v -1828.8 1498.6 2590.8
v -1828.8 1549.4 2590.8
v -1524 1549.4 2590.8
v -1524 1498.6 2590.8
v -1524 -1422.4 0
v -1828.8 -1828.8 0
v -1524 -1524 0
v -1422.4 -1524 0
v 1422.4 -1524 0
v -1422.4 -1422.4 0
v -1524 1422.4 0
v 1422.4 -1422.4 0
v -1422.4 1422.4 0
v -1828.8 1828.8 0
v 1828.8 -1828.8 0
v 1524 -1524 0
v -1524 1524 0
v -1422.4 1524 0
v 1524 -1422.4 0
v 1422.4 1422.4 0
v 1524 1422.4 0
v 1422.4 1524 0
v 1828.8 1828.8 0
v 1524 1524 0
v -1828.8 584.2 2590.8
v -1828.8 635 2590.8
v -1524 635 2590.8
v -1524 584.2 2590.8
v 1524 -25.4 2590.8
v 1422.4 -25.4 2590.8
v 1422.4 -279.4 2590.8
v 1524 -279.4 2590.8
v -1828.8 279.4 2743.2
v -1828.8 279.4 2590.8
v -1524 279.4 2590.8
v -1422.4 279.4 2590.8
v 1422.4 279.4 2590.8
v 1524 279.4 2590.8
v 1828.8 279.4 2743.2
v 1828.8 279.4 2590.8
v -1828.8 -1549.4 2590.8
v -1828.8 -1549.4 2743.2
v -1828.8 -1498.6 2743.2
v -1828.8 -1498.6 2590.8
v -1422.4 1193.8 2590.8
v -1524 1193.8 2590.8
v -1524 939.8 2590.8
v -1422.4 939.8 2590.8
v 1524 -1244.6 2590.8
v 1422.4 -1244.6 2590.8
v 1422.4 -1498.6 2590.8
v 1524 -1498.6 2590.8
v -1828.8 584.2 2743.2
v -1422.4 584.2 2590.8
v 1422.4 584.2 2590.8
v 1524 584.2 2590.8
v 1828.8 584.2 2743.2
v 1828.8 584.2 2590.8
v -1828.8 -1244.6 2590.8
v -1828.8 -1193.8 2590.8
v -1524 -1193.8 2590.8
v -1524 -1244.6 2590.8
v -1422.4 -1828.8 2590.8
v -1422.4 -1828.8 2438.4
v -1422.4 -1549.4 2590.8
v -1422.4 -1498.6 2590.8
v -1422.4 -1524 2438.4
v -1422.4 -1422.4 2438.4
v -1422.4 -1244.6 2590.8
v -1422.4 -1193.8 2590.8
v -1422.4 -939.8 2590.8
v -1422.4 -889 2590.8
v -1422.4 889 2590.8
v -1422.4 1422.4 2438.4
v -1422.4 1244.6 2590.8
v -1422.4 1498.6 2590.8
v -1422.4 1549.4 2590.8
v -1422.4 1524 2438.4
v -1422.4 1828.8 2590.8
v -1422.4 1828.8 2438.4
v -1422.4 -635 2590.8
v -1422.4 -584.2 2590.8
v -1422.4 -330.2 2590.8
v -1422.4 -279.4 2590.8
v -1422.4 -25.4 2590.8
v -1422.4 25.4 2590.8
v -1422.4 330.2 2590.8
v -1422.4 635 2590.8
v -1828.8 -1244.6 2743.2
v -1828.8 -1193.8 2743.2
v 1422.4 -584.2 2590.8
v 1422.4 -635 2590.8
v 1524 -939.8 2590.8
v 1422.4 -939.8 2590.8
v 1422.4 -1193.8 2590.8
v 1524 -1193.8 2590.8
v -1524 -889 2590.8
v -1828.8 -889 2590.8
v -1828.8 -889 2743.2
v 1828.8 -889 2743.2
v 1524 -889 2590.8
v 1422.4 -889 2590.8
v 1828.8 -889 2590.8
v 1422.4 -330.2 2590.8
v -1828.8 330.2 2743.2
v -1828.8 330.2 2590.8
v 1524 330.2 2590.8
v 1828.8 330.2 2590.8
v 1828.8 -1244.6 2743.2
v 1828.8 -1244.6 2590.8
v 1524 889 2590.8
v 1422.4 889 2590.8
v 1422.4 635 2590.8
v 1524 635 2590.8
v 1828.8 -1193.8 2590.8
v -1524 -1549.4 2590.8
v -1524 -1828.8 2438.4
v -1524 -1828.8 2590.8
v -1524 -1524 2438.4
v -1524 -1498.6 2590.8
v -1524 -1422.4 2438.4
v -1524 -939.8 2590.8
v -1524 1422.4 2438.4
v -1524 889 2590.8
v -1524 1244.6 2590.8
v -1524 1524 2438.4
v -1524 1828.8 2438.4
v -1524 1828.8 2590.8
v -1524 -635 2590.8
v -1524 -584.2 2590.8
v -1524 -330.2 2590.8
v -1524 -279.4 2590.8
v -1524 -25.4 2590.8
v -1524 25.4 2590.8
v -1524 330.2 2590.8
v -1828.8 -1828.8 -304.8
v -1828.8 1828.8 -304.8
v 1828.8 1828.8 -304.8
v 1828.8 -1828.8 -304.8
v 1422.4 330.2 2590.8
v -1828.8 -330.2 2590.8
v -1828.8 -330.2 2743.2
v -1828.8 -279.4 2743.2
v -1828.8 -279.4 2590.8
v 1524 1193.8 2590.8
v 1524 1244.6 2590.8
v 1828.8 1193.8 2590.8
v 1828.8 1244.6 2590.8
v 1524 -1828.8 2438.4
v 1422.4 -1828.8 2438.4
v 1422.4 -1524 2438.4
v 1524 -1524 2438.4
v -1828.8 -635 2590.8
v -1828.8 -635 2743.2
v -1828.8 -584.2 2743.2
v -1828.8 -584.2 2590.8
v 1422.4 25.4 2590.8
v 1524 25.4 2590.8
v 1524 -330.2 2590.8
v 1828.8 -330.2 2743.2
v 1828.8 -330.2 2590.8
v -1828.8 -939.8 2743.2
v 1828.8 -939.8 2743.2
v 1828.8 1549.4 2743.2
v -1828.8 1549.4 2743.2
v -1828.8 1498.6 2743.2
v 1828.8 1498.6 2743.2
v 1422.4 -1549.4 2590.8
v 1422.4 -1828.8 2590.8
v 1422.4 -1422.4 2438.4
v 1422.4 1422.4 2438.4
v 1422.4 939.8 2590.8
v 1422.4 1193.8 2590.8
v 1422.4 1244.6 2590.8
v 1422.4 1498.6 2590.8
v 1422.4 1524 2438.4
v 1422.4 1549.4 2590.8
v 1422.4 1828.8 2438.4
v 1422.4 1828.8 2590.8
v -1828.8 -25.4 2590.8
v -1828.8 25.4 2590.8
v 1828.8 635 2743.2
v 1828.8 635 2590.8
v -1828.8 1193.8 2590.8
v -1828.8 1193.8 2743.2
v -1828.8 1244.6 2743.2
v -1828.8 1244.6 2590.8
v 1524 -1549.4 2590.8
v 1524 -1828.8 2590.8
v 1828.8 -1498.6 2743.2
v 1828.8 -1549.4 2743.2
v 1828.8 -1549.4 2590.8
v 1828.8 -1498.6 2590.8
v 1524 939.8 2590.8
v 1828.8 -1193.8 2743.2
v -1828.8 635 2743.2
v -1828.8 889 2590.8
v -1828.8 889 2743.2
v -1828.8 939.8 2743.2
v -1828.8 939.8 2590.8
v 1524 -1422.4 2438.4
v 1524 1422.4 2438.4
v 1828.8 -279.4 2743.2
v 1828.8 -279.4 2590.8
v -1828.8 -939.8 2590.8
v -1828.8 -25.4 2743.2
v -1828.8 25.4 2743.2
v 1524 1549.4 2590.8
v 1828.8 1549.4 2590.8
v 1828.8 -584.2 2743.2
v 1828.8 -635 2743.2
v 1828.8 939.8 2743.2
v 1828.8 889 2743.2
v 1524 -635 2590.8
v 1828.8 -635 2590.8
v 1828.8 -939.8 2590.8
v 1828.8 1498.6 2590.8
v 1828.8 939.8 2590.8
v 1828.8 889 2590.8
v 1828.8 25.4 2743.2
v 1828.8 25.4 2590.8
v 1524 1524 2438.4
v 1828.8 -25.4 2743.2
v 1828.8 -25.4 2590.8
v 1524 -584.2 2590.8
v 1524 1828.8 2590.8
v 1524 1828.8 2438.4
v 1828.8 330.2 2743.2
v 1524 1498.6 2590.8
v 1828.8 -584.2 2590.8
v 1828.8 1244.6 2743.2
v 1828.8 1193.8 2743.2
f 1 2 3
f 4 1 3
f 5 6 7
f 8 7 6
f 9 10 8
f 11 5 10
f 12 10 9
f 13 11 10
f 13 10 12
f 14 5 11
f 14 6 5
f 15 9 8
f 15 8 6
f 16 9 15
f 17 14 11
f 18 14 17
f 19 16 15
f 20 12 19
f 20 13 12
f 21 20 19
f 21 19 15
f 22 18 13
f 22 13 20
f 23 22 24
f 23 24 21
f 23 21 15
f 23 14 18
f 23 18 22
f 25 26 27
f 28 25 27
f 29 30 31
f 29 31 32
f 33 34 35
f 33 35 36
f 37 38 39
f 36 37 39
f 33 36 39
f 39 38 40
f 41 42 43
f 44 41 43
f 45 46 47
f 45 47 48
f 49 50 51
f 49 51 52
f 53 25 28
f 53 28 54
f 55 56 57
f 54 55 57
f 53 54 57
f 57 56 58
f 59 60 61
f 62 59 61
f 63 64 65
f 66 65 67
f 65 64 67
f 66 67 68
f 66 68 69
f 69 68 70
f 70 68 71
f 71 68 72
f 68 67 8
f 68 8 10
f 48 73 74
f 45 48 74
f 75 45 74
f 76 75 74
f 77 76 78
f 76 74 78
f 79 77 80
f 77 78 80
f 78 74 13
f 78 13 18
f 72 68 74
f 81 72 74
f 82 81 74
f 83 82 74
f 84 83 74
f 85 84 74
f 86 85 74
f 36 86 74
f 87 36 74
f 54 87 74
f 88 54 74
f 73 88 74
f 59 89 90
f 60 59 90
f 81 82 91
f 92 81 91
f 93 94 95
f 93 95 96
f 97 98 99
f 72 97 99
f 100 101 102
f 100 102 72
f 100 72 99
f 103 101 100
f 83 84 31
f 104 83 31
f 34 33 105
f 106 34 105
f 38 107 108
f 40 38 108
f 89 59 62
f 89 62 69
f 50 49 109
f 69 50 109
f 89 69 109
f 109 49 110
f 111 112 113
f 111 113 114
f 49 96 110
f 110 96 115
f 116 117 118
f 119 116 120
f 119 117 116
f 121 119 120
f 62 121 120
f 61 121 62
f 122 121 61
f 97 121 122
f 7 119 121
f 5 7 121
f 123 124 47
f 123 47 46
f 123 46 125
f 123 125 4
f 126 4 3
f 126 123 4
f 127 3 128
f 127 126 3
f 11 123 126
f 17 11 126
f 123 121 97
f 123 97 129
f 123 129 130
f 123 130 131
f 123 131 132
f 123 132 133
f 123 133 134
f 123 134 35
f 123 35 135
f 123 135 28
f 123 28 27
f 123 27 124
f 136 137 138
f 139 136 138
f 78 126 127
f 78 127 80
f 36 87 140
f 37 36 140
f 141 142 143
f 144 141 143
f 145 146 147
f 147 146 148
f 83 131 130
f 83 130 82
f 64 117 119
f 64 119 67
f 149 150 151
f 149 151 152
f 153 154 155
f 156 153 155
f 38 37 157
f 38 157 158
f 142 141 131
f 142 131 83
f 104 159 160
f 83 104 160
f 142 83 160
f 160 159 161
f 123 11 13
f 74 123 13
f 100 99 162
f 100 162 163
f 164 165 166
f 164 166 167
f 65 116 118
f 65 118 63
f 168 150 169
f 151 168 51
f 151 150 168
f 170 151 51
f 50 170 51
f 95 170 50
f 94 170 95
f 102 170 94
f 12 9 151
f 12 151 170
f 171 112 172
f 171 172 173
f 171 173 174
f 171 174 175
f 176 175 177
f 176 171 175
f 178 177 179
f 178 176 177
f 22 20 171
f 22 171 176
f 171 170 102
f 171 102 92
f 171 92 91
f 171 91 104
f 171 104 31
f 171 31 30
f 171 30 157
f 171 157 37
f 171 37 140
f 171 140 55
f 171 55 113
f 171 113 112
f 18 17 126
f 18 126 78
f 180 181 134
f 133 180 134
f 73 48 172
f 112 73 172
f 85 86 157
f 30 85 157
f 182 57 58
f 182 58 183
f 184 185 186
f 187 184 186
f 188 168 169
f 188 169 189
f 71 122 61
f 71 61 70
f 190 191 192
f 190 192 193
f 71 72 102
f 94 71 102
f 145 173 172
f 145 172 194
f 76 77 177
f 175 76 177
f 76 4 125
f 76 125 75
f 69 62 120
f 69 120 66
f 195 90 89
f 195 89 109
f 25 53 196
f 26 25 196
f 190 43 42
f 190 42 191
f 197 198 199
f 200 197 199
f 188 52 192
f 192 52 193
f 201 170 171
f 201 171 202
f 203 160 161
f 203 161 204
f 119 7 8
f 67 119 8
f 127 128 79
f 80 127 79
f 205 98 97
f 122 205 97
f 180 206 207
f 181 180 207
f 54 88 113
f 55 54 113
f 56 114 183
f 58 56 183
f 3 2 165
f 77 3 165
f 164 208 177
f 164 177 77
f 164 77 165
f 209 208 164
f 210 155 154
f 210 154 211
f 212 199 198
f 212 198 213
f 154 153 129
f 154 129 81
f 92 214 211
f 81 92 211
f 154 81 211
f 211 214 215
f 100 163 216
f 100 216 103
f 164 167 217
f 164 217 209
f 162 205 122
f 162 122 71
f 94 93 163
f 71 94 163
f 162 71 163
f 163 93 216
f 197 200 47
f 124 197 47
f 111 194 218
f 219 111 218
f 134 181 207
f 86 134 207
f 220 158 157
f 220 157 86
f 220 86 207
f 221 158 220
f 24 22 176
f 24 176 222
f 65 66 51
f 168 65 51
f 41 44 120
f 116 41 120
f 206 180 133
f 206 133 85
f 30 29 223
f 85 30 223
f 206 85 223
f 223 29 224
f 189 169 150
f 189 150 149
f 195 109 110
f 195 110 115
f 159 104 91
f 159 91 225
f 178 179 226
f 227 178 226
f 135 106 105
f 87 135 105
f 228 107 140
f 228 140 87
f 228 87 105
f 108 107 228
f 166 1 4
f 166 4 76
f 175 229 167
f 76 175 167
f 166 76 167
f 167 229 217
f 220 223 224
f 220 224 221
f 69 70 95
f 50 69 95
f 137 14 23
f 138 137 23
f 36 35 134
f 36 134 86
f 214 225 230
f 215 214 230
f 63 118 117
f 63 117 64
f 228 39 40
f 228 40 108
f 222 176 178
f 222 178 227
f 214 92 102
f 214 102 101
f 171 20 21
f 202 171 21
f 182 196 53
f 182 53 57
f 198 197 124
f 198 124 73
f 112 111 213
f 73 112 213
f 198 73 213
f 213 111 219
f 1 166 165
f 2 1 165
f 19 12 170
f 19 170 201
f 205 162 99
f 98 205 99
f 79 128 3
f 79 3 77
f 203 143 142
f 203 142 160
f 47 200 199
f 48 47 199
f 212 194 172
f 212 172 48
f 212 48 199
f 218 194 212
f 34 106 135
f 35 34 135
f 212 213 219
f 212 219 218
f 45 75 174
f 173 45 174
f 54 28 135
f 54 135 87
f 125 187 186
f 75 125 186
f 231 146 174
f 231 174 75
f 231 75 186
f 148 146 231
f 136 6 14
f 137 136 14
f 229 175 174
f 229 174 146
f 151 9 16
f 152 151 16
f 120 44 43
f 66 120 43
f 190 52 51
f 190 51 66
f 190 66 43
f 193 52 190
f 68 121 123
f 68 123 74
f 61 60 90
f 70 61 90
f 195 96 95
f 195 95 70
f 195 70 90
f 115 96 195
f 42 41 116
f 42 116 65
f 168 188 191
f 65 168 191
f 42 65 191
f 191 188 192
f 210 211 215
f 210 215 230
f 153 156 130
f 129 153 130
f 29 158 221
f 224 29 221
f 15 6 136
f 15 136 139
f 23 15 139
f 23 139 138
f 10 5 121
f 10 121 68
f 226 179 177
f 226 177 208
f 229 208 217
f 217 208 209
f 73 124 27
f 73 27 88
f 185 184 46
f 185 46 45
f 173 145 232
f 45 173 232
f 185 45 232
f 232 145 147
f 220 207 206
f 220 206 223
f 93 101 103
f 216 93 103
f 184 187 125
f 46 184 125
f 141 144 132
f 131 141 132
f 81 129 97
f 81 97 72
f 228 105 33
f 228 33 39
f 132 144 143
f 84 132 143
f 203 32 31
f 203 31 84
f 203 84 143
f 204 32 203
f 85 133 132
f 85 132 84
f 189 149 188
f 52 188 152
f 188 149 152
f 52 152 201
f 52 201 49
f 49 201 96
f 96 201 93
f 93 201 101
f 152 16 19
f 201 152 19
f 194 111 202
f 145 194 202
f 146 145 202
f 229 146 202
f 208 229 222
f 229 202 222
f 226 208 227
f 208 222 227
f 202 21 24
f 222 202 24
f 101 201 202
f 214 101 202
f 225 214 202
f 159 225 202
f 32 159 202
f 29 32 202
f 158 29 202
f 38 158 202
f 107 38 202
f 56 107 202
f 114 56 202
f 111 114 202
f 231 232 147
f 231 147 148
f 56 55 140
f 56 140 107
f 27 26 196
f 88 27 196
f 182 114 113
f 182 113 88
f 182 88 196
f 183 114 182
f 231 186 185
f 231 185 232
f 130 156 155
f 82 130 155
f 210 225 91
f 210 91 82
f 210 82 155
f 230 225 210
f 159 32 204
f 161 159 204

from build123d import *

# Parameters (mm, degrees)
F0_W     = 3657.6
F0_H     = 3657.6
F1_DEPTH = 304.8
F2_W     = 101.6
F2_H     = 101.6
F3_DEPTH = 2438.4
F4_W     = 101.6
F4_H     = 3657.6
F5_DEPTH = 152.4
F6_W     = 3657.6
F6_H     = 50.8
F7_DEPTH = 152.4


with BuildPart() as f1:
    # F0 (on Top) → F1 (new body)
    with BuildSketch(Plane.XY):
        Rectangle(F0_W, F0_H)
    extrude(amount=-F1_DEPTH)

    # F2 (on face) → F3 (join)
    with BuildSketch(Plane.XY):
        with Locations((-1473.2, 1473.2)):
            Rectangle(F2_W, F2_H)
        with Locations((1473.2, 1473.2)):
            Rectangle(F2_W, F2_H)
        with Locations((1473.2, -1473.2)):
            Rectangle(F2_W, F2_H)
        with Locations((-1473.2, -1473.2)):
            Rectangle(F2_W, F2_H)
    extrude(amount=F3_DEPTH)

    # F4 (on face) → F5 (join)
    with BuildSketch(Plane.XY.offset(2438.4)):
        with Locations((-1473.2, 0)):
            Rectangle(F4_W, F4_H)
        with Locations((1473.2, 0)):
            Rectangle(F4_W, F4_H)
    extrude(amount=F5_DEPTH)

    # F6 (on face) → F7 (join)
    with BuildSketch(Plane.XY.offset(2590.8)):
        with Locations((0, -1524)):
            Rectangle(F6_W, F6_H)
        with Locations((0, -1219.2)):
            Rectangle(F6_W, F6_H)
        with Locations((0, -914.4)):
            Rectangle(F6_W, F6_H)
        with Locations((0, -609.6)):
            Rectangle(F6_W, F6_H)
        with Locations((0, -304.8)):
            Rectangle(F6_W, F6_H)
        Rectangle(F6_W, F6_H)
        with Locations((0, 304.8)):
            Rectangle(F6_W, F6_H)
        with Locations((0, 609.6)):
            Rectangle(F6_W, F6_H)
        with Locations((0, 914.4)):
            Rectangle(F6_W, F6_H)
        with Locations((0, 1219.2)):
            Rectangle(F6_W, F6_H)
        with Locations((0, 1524)):
            Rectangle(F6_W, F6_H)
    extrude(amount=F7_DEPTH)


solid = f1.part
